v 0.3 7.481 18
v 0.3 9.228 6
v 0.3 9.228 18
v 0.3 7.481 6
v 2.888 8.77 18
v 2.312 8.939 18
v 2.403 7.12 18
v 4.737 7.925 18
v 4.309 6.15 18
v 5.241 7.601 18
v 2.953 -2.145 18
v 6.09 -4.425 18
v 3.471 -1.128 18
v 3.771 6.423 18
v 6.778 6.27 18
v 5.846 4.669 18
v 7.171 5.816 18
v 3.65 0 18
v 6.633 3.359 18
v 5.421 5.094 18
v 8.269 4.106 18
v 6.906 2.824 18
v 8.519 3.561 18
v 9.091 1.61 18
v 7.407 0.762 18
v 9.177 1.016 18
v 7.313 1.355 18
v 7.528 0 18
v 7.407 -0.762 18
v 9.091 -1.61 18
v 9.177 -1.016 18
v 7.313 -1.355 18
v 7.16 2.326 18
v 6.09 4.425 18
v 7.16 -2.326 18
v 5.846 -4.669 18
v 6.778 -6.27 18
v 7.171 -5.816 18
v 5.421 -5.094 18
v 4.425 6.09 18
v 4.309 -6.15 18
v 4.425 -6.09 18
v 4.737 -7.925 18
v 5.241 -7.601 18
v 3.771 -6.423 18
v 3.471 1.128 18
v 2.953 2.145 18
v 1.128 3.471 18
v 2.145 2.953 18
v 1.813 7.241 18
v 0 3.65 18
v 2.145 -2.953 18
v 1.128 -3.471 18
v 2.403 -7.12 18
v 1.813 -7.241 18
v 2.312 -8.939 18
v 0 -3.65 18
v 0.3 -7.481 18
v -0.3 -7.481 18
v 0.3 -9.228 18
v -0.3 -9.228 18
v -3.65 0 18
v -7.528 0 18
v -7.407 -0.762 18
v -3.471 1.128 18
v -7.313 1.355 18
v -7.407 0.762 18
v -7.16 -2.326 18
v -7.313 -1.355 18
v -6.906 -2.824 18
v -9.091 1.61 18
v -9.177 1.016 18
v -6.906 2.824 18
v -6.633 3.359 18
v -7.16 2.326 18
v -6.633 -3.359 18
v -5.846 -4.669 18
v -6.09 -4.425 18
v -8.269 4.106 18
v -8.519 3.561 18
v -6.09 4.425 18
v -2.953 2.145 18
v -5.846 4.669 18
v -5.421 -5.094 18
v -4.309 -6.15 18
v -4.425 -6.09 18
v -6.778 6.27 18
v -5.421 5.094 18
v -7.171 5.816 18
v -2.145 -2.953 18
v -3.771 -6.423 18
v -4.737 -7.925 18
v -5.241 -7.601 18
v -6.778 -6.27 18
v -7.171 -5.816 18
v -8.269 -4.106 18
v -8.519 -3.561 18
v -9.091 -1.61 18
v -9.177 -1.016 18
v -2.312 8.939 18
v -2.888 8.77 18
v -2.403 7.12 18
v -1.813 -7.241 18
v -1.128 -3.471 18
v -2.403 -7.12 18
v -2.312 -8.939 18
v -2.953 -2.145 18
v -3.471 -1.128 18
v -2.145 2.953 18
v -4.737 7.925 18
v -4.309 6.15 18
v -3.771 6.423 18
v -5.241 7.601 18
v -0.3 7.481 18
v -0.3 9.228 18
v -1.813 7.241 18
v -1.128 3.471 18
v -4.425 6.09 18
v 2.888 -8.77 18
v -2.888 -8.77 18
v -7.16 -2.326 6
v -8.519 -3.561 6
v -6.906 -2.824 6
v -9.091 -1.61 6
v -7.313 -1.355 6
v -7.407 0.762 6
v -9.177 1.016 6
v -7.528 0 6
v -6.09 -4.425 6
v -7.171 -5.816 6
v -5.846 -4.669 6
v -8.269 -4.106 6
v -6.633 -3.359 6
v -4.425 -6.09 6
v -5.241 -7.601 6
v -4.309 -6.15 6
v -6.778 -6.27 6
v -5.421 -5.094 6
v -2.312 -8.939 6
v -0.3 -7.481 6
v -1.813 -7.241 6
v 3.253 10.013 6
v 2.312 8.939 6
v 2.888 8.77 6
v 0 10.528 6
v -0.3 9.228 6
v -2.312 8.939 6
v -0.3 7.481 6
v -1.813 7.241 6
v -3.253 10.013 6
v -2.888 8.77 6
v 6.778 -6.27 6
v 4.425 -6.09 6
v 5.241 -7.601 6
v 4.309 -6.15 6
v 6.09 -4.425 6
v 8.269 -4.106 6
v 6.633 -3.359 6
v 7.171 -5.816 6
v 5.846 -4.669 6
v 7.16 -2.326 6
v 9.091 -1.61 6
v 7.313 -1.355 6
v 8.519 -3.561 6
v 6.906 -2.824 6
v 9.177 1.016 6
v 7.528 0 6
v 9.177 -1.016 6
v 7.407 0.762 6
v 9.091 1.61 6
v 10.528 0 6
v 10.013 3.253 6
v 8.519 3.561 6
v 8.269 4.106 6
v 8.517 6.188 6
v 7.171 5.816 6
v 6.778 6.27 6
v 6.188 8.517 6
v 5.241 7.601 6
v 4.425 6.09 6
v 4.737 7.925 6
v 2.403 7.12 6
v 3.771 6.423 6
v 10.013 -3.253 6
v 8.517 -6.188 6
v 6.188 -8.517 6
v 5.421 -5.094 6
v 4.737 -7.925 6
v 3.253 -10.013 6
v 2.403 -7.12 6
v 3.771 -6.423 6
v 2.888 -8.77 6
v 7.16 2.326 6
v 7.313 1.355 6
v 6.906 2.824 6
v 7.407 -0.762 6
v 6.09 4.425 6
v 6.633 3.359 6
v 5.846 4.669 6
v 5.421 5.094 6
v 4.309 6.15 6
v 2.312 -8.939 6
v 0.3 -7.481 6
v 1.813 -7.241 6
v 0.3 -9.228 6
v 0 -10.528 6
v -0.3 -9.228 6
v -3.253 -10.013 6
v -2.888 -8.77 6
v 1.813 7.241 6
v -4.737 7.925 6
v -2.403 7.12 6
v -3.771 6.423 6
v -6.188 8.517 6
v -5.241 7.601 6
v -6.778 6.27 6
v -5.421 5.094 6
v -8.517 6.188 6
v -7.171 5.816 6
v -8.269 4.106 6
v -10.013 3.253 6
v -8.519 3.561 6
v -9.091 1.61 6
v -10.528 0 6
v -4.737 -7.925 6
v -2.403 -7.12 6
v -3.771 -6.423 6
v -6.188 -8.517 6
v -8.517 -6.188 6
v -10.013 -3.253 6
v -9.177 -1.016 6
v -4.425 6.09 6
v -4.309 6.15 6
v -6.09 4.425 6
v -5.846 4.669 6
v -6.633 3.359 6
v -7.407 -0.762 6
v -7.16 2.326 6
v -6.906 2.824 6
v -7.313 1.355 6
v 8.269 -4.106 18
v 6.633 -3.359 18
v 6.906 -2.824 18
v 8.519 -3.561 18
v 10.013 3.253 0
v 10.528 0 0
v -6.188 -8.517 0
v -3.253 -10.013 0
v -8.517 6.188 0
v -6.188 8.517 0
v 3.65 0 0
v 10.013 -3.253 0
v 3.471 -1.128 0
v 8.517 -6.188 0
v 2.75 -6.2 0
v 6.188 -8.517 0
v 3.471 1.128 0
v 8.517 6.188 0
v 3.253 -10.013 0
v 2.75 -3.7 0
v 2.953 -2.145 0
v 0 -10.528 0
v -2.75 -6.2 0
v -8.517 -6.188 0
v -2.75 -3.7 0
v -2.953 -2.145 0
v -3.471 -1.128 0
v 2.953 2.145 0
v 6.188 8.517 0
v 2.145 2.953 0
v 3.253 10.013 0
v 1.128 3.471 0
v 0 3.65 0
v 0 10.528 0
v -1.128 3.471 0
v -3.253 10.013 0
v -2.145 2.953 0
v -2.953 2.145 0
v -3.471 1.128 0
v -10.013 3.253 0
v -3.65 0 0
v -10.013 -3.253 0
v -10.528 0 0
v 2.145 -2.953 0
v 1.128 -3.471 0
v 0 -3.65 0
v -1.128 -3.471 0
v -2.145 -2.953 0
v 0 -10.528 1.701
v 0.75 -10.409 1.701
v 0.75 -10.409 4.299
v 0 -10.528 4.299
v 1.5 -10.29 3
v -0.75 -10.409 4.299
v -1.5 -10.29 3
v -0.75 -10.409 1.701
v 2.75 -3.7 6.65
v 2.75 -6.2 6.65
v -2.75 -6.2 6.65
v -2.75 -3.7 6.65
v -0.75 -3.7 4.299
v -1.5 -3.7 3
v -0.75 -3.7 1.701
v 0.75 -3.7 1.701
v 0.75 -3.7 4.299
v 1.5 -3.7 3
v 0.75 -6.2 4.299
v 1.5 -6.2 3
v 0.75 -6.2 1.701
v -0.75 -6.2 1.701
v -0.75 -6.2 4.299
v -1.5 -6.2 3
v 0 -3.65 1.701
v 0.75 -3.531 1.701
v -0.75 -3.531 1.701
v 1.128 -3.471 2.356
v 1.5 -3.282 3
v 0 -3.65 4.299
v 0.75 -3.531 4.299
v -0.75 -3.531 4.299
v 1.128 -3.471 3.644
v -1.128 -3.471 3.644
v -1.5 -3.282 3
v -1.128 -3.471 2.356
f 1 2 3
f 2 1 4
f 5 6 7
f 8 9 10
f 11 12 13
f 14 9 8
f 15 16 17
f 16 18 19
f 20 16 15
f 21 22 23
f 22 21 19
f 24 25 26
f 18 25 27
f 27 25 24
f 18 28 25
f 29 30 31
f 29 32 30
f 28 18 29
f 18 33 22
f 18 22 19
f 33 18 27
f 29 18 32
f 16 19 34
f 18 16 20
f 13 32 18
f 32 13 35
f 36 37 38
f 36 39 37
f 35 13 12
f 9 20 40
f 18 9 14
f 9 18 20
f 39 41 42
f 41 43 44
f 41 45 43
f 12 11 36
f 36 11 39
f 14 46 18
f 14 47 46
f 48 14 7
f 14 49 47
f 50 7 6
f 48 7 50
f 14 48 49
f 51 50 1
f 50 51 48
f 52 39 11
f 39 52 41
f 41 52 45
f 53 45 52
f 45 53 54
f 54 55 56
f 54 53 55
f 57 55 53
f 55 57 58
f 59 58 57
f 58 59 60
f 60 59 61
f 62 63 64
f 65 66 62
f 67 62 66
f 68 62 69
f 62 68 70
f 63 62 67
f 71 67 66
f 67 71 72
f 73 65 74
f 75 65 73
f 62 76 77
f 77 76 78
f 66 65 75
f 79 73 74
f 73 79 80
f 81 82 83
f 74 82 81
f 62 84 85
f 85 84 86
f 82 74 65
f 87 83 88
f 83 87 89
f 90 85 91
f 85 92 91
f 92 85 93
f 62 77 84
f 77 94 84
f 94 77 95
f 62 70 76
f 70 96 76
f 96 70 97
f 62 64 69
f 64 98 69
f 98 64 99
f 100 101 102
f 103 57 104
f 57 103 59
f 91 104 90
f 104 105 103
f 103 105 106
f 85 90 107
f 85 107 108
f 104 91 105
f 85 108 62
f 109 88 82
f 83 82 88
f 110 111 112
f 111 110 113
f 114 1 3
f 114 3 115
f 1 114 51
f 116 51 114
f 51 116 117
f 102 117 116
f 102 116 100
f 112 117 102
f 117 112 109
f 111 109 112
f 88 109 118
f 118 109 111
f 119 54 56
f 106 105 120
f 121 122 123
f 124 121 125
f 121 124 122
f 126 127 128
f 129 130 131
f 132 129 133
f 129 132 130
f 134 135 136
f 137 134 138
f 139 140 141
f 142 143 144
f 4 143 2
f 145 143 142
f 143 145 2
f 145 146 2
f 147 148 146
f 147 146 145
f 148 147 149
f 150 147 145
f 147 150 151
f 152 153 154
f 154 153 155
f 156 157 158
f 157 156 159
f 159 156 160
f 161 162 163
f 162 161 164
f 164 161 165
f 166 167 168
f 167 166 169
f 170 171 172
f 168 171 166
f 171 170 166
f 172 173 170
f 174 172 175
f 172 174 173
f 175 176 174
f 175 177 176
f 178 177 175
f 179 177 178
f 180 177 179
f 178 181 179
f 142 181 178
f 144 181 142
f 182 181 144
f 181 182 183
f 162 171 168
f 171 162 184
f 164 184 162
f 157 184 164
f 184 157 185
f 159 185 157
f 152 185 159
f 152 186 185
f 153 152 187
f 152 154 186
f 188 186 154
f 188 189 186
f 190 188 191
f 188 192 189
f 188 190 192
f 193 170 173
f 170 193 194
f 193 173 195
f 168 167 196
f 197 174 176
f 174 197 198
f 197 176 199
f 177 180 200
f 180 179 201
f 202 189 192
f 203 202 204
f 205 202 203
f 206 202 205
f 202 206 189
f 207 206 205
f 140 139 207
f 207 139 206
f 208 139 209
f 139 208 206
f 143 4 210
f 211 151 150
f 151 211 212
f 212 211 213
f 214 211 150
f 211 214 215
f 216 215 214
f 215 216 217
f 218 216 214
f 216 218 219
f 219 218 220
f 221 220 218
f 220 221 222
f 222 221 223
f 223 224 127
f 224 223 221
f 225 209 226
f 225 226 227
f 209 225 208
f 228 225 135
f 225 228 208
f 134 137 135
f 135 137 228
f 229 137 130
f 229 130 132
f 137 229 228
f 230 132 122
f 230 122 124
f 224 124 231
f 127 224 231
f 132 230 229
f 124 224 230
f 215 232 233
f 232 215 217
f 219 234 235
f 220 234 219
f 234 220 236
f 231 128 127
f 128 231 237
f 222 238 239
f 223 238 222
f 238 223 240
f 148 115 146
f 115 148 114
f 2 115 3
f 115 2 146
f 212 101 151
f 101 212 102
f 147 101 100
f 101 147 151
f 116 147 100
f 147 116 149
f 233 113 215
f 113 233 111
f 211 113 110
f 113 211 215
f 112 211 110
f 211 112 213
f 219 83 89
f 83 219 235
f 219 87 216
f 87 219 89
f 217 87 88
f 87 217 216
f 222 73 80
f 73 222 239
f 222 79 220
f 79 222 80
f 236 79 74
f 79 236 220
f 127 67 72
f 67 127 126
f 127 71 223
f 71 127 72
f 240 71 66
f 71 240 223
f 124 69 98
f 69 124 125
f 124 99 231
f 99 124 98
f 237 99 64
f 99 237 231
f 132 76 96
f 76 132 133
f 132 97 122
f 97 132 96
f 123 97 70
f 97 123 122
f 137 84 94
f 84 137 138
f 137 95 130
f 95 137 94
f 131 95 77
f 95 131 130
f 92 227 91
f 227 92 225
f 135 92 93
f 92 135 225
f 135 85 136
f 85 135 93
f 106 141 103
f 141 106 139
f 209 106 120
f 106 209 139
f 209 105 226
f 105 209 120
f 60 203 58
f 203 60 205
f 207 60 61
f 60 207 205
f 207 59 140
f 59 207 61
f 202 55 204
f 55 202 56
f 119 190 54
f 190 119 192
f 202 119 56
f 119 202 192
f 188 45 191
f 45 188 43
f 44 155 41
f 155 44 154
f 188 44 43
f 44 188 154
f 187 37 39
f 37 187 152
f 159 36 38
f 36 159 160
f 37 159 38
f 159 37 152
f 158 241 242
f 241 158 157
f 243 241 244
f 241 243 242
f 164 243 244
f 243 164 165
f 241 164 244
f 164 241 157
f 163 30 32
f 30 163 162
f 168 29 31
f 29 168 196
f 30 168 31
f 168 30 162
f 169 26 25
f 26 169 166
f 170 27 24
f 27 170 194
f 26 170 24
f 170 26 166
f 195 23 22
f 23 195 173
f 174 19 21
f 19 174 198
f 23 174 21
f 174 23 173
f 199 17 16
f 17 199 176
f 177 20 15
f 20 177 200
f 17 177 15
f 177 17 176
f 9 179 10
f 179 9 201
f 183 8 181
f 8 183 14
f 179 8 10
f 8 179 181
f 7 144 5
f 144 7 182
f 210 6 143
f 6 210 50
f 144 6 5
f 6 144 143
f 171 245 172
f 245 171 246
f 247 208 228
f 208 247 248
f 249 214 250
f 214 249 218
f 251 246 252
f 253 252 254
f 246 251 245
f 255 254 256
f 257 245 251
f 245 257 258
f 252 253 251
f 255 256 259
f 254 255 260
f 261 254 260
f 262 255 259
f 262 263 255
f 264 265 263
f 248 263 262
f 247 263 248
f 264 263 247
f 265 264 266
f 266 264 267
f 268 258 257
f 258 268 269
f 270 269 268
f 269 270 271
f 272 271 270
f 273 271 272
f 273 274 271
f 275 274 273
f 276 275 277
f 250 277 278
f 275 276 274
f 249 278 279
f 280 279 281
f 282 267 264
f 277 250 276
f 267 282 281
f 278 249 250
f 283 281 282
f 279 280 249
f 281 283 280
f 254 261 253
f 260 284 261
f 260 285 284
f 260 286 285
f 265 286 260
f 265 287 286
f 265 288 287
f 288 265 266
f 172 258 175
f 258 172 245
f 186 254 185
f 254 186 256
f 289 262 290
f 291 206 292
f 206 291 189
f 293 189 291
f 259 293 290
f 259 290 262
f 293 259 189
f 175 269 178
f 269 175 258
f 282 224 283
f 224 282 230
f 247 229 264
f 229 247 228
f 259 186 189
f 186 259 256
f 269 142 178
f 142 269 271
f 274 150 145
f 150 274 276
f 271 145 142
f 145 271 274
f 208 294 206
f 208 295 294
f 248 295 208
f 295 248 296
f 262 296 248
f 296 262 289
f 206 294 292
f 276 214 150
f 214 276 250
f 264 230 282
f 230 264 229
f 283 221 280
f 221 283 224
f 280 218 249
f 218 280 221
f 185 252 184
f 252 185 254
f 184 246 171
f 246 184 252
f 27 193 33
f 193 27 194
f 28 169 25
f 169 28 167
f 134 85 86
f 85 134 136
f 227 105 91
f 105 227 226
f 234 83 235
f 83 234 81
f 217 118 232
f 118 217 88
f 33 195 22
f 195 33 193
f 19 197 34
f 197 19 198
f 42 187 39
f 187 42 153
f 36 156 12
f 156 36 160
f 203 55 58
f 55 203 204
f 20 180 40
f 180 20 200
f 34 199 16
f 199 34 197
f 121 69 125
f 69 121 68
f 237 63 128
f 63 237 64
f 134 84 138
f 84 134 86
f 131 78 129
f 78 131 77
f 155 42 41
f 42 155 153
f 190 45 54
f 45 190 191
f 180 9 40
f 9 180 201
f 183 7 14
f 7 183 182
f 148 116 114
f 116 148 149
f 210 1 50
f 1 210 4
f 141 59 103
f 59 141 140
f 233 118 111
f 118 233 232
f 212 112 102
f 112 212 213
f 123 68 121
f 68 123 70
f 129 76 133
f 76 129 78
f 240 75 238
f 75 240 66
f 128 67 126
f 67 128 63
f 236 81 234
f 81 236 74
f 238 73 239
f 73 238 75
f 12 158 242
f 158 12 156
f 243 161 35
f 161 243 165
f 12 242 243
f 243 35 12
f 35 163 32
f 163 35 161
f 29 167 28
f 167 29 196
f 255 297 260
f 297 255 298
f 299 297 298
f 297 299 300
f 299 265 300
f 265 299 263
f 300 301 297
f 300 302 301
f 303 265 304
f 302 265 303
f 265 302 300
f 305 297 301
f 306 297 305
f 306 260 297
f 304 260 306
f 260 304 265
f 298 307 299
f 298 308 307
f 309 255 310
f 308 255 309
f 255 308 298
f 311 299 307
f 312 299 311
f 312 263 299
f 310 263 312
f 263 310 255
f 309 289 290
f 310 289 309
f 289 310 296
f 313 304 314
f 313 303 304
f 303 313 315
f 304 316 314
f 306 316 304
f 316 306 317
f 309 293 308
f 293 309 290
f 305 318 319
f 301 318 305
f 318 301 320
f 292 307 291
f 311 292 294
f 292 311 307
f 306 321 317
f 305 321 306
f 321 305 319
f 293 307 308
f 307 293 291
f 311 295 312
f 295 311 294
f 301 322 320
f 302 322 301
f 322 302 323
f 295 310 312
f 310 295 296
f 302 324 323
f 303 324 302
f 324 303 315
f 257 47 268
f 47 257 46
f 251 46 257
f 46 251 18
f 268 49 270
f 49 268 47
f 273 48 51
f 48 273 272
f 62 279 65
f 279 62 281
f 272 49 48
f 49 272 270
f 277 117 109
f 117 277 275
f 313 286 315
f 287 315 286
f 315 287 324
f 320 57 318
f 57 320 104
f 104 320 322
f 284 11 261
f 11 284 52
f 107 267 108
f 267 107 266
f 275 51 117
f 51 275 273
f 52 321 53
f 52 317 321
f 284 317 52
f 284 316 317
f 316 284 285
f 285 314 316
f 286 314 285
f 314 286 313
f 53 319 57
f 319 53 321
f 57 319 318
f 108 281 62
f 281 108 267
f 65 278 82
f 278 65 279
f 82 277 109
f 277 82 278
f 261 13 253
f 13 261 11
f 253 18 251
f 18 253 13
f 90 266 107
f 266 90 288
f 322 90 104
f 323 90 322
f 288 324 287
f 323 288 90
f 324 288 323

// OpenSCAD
pi = 3.1415926535897932384626433832795;

module grubscrew(bore, Rad, flangedepth)
{
  translate([0, -(bore / 2) - 1.3, -flangedepth])
    cube([5.5, 2.5, bore], center = true);
  translate([0, 2-(bore / 2), 0])
    rotate(90, [1, 0, 0])
      cylinder(r = 1.5, h = Rad + 2, $fn = 6);
}

module   RenderPulley(teeth = 20, pitch = 2.3, depth = 7, tooththickness = 0.6, toothlength = 1.3, bore = 7, flangestyle = 3, flangesize = 3, flangedepth = 1, grub = 0)
{

  //SCAD can't handle assignments inside conditional if, nor can it handle complex conditional assigns, so need to combine multiple together
  shifttemp = (flangestyle == 1 ?flangedepth : 0);
  shift = (flangestyle == 3 ?flangedepth : shifttemp);

  Cir = teeth * pitch;
  Dia = Cir / pi;
  Rad = Dia / 2;
  Ang = 360 / teeth;

  difference()
  {
    translate([0, 0, shift])
    union()
    {
      if ((flangestyle == 1) || (flangestyle == 3))
      {
        translate([0, 0, -flangedepth])
        cylinder(r = Rad + flangesize, h = flangedepth, $fn = 20);
      }
      if ((flangestyle == 2) || (flangestyle == 3))
      {
        translate([0, 0, depth])
        cylinder(r = Rad + flangesize, h = flangedepth, $fn = 20);
      }
      for (i = [0 : teeth - 1])
      {
        rotate(Ang * i, [0, 0, 1])
        translate([- tooththickness / 2, 0, 0])
        cube([tooththickness, Rad + toothlength, depth]);
      }
      cylinder(r = Rad, h = depth, $fn = 20);
    }
    translate([0, 0, -2])
    cylinder(r = bore / 2, h = depth + (flangedepth * 2) + 2, $fn = 20);

    if (grub == 1)
    {
      translate([0, 0, flangedepth / 2])
        grubscrew(bore = bore, Rad = Rad, flangedepth = (flangedepth / 2) - 3);
    }
  }
}

module pulley(style, teeth, depth, bore, flangestyle, flangesize, flangedepth, grub)
{
    if (style == "T2.5")
    {
      //2.18 is too wide with 22 teeth. not sure about other teeth counts
      RenderPulley(pitch = 2.15, tooththickness = 0.6, toothlength = 1.7, flangestyle = flangestyle, teeth = teeth, depth = depth, bore = bore, flangesize = flangesize, flangedepth = flangedepth, grub = grub);
    }
}

pulley(style = "T2.5", teeth = 22, depth = 12, bore = 7.3, flangestyle = 1, flangesize = 3, flangedepth = 6, grub = 1);
